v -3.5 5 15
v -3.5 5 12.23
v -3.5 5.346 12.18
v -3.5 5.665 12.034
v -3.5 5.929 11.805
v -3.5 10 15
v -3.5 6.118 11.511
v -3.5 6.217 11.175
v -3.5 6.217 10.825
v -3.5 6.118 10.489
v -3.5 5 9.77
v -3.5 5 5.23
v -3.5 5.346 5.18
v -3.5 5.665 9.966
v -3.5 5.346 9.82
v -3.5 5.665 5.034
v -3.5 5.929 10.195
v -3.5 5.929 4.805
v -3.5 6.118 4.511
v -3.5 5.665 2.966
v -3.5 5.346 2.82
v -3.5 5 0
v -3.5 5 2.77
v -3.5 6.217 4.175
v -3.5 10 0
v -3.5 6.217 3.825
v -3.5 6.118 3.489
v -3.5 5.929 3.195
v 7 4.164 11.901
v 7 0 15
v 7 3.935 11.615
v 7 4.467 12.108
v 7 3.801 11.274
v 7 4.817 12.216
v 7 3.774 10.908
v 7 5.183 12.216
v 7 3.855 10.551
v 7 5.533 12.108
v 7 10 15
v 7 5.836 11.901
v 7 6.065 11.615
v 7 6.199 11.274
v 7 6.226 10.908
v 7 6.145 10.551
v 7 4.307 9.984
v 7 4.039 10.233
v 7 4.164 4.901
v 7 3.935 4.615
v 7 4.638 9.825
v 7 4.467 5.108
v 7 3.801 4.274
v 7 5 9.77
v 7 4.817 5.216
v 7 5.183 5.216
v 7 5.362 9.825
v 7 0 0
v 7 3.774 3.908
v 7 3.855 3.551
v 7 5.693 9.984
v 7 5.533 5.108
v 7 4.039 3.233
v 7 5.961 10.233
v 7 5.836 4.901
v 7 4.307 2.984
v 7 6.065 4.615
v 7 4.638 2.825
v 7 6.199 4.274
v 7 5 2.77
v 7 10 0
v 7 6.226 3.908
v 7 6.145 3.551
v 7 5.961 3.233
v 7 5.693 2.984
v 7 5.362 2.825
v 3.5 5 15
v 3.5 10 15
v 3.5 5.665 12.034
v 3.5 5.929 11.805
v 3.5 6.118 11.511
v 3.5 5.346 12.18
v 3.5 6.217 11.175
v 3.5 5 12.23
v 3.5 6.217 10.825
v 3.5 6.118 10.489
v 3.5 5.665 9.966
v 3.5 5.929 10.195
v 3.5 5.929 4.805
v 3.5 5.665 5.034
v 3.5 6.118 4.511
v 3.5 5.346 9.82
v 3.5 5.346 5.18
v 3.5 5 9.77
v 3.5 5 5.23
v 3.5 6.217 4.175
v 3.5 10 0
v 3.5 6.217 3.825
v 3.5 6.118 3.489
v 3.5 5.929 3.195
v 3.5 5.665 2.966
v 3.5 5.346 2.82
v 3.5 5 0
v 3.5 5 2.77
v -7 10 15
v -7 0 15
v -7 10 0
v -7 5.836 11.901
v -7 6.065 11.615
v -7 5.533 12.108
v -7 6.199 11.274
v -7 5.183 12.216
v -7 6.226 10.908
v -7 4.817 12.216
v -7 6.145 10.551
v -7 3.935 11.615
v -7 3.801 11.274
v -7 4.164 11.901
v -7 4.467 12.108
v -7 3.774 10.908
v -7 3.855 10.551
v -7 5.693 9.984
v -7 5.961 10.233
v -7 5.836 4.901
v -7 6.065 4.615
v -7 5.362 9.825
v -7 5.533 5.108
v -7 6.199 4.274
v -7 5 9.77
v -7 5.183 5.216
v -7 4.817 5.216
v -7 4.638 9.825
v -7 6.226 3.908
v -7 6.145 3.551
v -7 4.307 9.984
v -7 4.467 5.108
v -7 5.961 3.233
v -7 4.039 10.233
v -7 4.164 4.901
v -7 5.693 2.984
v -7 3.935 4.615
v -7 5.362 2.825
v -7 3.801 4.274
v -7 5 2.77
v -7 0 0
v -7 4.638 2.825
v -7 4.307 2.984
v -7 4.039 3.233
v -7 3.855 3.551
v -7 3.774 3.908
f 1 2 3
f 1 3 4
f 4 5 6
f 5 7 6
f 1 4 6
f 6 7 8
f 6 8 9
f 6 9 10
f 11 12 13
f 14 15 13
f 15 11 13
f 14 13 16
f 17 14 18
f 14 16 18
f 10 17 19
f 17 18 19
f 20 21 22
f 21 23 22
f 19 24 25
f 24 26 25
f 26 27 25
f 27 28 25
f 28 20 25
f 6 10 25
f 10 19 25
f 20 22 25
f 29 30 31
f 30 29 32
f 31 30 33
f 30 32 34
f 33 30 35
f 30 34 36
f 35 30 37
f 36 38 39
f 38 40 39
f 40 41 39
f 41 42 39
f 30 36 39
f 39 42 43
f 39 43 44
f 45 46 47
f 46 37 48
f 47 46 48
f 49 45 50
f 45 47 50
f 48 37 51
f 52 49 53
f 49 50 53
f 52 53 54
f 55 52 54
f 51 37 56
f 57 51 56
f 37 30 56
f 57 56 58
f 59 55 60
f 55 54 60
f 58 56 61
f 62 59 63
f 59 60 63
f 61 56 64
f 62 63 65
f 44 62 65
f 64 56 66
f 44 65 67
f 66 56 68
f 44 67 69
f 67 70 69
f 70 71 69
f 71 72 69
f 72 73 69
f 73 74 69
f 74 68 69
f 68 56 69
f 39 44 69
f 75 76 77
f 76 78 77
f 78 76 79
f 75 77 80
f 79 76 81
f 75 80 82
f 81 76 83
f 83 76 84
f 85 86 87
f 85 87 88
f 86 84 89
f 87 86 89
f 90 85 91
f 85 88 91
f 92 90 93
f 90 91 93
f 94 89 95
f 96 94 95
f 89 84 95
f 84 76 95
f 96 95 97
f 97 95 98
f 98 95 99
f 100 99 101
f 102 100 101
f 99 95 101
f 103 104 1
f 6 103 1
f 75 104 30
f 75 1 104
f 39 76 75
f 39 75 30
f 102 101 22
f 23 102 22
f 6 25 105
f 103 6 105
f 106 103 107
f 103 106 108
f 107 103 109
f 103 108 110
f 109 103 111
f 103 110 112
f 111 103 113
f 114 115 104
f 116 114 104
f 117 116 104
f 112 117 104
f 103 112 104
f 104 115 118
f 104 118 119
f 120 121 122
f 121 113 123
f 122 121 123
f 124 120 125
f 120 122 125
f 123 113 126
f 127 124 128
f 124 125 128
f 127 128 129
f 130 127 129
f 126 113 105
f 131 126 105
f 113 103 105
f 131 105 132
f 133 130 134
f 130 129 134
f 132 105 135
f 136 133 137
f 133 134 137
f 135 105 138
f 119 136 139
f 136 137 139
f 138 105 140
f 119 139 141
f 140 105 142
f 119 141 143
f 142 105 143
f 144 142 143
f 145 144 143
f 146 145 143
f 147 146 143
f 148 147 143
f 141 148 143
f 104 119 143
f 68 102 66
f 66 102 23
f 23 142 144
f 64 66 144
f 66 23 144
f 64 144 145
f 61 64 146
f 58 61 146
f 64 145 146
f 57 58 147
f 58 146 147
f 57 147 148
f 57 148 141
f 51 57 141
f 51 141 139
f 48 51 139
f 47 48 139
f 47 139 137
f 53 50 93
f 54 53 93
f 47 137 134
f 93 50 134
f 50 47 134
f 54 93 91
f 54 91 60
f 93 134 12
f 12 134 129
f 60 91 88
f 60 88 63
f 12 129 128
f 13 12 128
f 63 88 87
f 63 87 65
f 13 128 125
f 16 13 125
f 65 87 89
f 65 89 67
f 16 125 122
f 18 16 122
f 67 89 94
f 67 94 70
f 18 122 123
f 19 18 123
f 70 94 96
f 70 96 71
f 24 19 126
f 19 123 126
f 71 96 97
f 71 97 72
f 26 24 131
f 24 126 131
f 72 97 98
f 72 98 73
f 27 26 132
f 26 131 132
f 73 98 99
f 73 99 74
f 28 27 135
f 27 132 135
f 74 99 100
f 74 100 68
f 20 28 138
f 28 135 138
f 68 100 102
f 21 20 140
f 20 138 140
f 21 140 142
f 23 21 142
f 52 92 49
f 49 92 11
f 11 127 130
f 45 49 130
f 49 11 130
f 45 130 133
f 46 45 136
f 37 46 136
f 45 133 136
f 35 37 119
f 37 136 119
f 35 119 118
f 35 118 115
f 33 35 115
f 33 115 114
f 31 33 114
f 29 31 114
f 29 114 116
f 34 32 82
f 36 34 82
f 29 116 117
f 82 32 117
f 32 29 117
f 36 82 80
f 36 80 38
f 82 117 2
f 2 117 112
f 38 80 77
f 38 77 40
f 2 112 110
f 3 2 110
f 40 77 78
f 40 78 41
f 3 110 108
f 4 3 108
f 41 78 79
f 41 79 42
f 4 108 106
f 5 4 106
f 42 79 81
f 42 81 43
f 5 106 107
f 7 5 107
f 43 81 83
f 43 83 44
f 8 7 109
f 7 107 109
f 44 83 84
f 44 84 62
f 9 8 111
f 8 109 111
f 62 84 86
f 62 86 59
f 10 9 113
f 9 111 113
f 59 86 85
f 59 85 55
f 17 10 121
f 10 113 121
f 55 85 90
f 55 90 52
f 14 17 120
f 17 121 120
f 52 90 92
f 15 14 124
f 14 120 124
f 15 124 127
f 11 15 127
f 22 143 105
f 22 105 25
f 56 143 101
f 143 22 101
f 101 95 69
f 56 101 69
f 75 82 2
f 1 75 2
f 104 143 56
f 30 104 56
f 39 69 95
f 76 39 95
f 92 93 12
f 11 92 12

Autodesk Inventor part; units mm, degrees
ref_plane "YZ Plane" through (0, 0, 0) normal (1, 0, 0) x (0, 1, 0)
ref_plane "XZ Plane" through (0, 0, 0) normal (0, 1, 0) x (-1, 0, 0)
ref_plane "XY Plane" through (0, 0, 0) normal (0, 0, 1) x (1, 0, 0)
sketch "Skizze1" plane through (0, 0, 0) normal (0, 0, 1) x (1, 0, 0)
  line L0 (-9.8, 0) -> (9.8, 0) projected
  line L1 (0, -2) -> (0, 12) projected
  line L2 (-7, 0) -> (7, 0)
  line L3 (7, 0) -> (7, 10)
  line L4 (-7, 10) -> (-7, 0)
  line L5 (3.5, 10) -> (3.5, 5)
  line L6 (3.5, 5) -> (-3.5, 5)
  line L7 (-3.5, 5) -> (-3.5, 10)
  line L8 (7, 10) -> (3.5, 10)
  line L9 (-3.5, 10) -> (-7, 10)
  point P0 (0, 0)
  dimension "d0" = 10
  dimension "d1" = 5
  dimension "d3" = 3.5
  dimension "d6" = 7
extrude "Extrusion1" add sketch "Skizze1" along normal blind 15
sketch "Skizze2" plane through (7, 0, 0) normal (1, 0, 0) x (0, 0, -1)
  line L0 (-15, 10) -> (-15, 0) projected
  line L1 (0, 0) -> (-15, 0) projected
  line L2 (0, 0) -> (0, 10) projected
  line L3 (-15, 5) -> (0, 5)
  point P0 (-11, 5)
  point P1 (-4, 5)
  dimension "d9" = 4
  dimension "d10" = 4
  dimension "d11" = 5
hole "Bohrung1" at (7, 5, 11) at (7, 5, 4) direction (-1, 0, 0) diameter 2.459 end through all thread size "M3x0.5" class "6H" standard "ISO Metric profile"
properties part number "13_0204_052"
